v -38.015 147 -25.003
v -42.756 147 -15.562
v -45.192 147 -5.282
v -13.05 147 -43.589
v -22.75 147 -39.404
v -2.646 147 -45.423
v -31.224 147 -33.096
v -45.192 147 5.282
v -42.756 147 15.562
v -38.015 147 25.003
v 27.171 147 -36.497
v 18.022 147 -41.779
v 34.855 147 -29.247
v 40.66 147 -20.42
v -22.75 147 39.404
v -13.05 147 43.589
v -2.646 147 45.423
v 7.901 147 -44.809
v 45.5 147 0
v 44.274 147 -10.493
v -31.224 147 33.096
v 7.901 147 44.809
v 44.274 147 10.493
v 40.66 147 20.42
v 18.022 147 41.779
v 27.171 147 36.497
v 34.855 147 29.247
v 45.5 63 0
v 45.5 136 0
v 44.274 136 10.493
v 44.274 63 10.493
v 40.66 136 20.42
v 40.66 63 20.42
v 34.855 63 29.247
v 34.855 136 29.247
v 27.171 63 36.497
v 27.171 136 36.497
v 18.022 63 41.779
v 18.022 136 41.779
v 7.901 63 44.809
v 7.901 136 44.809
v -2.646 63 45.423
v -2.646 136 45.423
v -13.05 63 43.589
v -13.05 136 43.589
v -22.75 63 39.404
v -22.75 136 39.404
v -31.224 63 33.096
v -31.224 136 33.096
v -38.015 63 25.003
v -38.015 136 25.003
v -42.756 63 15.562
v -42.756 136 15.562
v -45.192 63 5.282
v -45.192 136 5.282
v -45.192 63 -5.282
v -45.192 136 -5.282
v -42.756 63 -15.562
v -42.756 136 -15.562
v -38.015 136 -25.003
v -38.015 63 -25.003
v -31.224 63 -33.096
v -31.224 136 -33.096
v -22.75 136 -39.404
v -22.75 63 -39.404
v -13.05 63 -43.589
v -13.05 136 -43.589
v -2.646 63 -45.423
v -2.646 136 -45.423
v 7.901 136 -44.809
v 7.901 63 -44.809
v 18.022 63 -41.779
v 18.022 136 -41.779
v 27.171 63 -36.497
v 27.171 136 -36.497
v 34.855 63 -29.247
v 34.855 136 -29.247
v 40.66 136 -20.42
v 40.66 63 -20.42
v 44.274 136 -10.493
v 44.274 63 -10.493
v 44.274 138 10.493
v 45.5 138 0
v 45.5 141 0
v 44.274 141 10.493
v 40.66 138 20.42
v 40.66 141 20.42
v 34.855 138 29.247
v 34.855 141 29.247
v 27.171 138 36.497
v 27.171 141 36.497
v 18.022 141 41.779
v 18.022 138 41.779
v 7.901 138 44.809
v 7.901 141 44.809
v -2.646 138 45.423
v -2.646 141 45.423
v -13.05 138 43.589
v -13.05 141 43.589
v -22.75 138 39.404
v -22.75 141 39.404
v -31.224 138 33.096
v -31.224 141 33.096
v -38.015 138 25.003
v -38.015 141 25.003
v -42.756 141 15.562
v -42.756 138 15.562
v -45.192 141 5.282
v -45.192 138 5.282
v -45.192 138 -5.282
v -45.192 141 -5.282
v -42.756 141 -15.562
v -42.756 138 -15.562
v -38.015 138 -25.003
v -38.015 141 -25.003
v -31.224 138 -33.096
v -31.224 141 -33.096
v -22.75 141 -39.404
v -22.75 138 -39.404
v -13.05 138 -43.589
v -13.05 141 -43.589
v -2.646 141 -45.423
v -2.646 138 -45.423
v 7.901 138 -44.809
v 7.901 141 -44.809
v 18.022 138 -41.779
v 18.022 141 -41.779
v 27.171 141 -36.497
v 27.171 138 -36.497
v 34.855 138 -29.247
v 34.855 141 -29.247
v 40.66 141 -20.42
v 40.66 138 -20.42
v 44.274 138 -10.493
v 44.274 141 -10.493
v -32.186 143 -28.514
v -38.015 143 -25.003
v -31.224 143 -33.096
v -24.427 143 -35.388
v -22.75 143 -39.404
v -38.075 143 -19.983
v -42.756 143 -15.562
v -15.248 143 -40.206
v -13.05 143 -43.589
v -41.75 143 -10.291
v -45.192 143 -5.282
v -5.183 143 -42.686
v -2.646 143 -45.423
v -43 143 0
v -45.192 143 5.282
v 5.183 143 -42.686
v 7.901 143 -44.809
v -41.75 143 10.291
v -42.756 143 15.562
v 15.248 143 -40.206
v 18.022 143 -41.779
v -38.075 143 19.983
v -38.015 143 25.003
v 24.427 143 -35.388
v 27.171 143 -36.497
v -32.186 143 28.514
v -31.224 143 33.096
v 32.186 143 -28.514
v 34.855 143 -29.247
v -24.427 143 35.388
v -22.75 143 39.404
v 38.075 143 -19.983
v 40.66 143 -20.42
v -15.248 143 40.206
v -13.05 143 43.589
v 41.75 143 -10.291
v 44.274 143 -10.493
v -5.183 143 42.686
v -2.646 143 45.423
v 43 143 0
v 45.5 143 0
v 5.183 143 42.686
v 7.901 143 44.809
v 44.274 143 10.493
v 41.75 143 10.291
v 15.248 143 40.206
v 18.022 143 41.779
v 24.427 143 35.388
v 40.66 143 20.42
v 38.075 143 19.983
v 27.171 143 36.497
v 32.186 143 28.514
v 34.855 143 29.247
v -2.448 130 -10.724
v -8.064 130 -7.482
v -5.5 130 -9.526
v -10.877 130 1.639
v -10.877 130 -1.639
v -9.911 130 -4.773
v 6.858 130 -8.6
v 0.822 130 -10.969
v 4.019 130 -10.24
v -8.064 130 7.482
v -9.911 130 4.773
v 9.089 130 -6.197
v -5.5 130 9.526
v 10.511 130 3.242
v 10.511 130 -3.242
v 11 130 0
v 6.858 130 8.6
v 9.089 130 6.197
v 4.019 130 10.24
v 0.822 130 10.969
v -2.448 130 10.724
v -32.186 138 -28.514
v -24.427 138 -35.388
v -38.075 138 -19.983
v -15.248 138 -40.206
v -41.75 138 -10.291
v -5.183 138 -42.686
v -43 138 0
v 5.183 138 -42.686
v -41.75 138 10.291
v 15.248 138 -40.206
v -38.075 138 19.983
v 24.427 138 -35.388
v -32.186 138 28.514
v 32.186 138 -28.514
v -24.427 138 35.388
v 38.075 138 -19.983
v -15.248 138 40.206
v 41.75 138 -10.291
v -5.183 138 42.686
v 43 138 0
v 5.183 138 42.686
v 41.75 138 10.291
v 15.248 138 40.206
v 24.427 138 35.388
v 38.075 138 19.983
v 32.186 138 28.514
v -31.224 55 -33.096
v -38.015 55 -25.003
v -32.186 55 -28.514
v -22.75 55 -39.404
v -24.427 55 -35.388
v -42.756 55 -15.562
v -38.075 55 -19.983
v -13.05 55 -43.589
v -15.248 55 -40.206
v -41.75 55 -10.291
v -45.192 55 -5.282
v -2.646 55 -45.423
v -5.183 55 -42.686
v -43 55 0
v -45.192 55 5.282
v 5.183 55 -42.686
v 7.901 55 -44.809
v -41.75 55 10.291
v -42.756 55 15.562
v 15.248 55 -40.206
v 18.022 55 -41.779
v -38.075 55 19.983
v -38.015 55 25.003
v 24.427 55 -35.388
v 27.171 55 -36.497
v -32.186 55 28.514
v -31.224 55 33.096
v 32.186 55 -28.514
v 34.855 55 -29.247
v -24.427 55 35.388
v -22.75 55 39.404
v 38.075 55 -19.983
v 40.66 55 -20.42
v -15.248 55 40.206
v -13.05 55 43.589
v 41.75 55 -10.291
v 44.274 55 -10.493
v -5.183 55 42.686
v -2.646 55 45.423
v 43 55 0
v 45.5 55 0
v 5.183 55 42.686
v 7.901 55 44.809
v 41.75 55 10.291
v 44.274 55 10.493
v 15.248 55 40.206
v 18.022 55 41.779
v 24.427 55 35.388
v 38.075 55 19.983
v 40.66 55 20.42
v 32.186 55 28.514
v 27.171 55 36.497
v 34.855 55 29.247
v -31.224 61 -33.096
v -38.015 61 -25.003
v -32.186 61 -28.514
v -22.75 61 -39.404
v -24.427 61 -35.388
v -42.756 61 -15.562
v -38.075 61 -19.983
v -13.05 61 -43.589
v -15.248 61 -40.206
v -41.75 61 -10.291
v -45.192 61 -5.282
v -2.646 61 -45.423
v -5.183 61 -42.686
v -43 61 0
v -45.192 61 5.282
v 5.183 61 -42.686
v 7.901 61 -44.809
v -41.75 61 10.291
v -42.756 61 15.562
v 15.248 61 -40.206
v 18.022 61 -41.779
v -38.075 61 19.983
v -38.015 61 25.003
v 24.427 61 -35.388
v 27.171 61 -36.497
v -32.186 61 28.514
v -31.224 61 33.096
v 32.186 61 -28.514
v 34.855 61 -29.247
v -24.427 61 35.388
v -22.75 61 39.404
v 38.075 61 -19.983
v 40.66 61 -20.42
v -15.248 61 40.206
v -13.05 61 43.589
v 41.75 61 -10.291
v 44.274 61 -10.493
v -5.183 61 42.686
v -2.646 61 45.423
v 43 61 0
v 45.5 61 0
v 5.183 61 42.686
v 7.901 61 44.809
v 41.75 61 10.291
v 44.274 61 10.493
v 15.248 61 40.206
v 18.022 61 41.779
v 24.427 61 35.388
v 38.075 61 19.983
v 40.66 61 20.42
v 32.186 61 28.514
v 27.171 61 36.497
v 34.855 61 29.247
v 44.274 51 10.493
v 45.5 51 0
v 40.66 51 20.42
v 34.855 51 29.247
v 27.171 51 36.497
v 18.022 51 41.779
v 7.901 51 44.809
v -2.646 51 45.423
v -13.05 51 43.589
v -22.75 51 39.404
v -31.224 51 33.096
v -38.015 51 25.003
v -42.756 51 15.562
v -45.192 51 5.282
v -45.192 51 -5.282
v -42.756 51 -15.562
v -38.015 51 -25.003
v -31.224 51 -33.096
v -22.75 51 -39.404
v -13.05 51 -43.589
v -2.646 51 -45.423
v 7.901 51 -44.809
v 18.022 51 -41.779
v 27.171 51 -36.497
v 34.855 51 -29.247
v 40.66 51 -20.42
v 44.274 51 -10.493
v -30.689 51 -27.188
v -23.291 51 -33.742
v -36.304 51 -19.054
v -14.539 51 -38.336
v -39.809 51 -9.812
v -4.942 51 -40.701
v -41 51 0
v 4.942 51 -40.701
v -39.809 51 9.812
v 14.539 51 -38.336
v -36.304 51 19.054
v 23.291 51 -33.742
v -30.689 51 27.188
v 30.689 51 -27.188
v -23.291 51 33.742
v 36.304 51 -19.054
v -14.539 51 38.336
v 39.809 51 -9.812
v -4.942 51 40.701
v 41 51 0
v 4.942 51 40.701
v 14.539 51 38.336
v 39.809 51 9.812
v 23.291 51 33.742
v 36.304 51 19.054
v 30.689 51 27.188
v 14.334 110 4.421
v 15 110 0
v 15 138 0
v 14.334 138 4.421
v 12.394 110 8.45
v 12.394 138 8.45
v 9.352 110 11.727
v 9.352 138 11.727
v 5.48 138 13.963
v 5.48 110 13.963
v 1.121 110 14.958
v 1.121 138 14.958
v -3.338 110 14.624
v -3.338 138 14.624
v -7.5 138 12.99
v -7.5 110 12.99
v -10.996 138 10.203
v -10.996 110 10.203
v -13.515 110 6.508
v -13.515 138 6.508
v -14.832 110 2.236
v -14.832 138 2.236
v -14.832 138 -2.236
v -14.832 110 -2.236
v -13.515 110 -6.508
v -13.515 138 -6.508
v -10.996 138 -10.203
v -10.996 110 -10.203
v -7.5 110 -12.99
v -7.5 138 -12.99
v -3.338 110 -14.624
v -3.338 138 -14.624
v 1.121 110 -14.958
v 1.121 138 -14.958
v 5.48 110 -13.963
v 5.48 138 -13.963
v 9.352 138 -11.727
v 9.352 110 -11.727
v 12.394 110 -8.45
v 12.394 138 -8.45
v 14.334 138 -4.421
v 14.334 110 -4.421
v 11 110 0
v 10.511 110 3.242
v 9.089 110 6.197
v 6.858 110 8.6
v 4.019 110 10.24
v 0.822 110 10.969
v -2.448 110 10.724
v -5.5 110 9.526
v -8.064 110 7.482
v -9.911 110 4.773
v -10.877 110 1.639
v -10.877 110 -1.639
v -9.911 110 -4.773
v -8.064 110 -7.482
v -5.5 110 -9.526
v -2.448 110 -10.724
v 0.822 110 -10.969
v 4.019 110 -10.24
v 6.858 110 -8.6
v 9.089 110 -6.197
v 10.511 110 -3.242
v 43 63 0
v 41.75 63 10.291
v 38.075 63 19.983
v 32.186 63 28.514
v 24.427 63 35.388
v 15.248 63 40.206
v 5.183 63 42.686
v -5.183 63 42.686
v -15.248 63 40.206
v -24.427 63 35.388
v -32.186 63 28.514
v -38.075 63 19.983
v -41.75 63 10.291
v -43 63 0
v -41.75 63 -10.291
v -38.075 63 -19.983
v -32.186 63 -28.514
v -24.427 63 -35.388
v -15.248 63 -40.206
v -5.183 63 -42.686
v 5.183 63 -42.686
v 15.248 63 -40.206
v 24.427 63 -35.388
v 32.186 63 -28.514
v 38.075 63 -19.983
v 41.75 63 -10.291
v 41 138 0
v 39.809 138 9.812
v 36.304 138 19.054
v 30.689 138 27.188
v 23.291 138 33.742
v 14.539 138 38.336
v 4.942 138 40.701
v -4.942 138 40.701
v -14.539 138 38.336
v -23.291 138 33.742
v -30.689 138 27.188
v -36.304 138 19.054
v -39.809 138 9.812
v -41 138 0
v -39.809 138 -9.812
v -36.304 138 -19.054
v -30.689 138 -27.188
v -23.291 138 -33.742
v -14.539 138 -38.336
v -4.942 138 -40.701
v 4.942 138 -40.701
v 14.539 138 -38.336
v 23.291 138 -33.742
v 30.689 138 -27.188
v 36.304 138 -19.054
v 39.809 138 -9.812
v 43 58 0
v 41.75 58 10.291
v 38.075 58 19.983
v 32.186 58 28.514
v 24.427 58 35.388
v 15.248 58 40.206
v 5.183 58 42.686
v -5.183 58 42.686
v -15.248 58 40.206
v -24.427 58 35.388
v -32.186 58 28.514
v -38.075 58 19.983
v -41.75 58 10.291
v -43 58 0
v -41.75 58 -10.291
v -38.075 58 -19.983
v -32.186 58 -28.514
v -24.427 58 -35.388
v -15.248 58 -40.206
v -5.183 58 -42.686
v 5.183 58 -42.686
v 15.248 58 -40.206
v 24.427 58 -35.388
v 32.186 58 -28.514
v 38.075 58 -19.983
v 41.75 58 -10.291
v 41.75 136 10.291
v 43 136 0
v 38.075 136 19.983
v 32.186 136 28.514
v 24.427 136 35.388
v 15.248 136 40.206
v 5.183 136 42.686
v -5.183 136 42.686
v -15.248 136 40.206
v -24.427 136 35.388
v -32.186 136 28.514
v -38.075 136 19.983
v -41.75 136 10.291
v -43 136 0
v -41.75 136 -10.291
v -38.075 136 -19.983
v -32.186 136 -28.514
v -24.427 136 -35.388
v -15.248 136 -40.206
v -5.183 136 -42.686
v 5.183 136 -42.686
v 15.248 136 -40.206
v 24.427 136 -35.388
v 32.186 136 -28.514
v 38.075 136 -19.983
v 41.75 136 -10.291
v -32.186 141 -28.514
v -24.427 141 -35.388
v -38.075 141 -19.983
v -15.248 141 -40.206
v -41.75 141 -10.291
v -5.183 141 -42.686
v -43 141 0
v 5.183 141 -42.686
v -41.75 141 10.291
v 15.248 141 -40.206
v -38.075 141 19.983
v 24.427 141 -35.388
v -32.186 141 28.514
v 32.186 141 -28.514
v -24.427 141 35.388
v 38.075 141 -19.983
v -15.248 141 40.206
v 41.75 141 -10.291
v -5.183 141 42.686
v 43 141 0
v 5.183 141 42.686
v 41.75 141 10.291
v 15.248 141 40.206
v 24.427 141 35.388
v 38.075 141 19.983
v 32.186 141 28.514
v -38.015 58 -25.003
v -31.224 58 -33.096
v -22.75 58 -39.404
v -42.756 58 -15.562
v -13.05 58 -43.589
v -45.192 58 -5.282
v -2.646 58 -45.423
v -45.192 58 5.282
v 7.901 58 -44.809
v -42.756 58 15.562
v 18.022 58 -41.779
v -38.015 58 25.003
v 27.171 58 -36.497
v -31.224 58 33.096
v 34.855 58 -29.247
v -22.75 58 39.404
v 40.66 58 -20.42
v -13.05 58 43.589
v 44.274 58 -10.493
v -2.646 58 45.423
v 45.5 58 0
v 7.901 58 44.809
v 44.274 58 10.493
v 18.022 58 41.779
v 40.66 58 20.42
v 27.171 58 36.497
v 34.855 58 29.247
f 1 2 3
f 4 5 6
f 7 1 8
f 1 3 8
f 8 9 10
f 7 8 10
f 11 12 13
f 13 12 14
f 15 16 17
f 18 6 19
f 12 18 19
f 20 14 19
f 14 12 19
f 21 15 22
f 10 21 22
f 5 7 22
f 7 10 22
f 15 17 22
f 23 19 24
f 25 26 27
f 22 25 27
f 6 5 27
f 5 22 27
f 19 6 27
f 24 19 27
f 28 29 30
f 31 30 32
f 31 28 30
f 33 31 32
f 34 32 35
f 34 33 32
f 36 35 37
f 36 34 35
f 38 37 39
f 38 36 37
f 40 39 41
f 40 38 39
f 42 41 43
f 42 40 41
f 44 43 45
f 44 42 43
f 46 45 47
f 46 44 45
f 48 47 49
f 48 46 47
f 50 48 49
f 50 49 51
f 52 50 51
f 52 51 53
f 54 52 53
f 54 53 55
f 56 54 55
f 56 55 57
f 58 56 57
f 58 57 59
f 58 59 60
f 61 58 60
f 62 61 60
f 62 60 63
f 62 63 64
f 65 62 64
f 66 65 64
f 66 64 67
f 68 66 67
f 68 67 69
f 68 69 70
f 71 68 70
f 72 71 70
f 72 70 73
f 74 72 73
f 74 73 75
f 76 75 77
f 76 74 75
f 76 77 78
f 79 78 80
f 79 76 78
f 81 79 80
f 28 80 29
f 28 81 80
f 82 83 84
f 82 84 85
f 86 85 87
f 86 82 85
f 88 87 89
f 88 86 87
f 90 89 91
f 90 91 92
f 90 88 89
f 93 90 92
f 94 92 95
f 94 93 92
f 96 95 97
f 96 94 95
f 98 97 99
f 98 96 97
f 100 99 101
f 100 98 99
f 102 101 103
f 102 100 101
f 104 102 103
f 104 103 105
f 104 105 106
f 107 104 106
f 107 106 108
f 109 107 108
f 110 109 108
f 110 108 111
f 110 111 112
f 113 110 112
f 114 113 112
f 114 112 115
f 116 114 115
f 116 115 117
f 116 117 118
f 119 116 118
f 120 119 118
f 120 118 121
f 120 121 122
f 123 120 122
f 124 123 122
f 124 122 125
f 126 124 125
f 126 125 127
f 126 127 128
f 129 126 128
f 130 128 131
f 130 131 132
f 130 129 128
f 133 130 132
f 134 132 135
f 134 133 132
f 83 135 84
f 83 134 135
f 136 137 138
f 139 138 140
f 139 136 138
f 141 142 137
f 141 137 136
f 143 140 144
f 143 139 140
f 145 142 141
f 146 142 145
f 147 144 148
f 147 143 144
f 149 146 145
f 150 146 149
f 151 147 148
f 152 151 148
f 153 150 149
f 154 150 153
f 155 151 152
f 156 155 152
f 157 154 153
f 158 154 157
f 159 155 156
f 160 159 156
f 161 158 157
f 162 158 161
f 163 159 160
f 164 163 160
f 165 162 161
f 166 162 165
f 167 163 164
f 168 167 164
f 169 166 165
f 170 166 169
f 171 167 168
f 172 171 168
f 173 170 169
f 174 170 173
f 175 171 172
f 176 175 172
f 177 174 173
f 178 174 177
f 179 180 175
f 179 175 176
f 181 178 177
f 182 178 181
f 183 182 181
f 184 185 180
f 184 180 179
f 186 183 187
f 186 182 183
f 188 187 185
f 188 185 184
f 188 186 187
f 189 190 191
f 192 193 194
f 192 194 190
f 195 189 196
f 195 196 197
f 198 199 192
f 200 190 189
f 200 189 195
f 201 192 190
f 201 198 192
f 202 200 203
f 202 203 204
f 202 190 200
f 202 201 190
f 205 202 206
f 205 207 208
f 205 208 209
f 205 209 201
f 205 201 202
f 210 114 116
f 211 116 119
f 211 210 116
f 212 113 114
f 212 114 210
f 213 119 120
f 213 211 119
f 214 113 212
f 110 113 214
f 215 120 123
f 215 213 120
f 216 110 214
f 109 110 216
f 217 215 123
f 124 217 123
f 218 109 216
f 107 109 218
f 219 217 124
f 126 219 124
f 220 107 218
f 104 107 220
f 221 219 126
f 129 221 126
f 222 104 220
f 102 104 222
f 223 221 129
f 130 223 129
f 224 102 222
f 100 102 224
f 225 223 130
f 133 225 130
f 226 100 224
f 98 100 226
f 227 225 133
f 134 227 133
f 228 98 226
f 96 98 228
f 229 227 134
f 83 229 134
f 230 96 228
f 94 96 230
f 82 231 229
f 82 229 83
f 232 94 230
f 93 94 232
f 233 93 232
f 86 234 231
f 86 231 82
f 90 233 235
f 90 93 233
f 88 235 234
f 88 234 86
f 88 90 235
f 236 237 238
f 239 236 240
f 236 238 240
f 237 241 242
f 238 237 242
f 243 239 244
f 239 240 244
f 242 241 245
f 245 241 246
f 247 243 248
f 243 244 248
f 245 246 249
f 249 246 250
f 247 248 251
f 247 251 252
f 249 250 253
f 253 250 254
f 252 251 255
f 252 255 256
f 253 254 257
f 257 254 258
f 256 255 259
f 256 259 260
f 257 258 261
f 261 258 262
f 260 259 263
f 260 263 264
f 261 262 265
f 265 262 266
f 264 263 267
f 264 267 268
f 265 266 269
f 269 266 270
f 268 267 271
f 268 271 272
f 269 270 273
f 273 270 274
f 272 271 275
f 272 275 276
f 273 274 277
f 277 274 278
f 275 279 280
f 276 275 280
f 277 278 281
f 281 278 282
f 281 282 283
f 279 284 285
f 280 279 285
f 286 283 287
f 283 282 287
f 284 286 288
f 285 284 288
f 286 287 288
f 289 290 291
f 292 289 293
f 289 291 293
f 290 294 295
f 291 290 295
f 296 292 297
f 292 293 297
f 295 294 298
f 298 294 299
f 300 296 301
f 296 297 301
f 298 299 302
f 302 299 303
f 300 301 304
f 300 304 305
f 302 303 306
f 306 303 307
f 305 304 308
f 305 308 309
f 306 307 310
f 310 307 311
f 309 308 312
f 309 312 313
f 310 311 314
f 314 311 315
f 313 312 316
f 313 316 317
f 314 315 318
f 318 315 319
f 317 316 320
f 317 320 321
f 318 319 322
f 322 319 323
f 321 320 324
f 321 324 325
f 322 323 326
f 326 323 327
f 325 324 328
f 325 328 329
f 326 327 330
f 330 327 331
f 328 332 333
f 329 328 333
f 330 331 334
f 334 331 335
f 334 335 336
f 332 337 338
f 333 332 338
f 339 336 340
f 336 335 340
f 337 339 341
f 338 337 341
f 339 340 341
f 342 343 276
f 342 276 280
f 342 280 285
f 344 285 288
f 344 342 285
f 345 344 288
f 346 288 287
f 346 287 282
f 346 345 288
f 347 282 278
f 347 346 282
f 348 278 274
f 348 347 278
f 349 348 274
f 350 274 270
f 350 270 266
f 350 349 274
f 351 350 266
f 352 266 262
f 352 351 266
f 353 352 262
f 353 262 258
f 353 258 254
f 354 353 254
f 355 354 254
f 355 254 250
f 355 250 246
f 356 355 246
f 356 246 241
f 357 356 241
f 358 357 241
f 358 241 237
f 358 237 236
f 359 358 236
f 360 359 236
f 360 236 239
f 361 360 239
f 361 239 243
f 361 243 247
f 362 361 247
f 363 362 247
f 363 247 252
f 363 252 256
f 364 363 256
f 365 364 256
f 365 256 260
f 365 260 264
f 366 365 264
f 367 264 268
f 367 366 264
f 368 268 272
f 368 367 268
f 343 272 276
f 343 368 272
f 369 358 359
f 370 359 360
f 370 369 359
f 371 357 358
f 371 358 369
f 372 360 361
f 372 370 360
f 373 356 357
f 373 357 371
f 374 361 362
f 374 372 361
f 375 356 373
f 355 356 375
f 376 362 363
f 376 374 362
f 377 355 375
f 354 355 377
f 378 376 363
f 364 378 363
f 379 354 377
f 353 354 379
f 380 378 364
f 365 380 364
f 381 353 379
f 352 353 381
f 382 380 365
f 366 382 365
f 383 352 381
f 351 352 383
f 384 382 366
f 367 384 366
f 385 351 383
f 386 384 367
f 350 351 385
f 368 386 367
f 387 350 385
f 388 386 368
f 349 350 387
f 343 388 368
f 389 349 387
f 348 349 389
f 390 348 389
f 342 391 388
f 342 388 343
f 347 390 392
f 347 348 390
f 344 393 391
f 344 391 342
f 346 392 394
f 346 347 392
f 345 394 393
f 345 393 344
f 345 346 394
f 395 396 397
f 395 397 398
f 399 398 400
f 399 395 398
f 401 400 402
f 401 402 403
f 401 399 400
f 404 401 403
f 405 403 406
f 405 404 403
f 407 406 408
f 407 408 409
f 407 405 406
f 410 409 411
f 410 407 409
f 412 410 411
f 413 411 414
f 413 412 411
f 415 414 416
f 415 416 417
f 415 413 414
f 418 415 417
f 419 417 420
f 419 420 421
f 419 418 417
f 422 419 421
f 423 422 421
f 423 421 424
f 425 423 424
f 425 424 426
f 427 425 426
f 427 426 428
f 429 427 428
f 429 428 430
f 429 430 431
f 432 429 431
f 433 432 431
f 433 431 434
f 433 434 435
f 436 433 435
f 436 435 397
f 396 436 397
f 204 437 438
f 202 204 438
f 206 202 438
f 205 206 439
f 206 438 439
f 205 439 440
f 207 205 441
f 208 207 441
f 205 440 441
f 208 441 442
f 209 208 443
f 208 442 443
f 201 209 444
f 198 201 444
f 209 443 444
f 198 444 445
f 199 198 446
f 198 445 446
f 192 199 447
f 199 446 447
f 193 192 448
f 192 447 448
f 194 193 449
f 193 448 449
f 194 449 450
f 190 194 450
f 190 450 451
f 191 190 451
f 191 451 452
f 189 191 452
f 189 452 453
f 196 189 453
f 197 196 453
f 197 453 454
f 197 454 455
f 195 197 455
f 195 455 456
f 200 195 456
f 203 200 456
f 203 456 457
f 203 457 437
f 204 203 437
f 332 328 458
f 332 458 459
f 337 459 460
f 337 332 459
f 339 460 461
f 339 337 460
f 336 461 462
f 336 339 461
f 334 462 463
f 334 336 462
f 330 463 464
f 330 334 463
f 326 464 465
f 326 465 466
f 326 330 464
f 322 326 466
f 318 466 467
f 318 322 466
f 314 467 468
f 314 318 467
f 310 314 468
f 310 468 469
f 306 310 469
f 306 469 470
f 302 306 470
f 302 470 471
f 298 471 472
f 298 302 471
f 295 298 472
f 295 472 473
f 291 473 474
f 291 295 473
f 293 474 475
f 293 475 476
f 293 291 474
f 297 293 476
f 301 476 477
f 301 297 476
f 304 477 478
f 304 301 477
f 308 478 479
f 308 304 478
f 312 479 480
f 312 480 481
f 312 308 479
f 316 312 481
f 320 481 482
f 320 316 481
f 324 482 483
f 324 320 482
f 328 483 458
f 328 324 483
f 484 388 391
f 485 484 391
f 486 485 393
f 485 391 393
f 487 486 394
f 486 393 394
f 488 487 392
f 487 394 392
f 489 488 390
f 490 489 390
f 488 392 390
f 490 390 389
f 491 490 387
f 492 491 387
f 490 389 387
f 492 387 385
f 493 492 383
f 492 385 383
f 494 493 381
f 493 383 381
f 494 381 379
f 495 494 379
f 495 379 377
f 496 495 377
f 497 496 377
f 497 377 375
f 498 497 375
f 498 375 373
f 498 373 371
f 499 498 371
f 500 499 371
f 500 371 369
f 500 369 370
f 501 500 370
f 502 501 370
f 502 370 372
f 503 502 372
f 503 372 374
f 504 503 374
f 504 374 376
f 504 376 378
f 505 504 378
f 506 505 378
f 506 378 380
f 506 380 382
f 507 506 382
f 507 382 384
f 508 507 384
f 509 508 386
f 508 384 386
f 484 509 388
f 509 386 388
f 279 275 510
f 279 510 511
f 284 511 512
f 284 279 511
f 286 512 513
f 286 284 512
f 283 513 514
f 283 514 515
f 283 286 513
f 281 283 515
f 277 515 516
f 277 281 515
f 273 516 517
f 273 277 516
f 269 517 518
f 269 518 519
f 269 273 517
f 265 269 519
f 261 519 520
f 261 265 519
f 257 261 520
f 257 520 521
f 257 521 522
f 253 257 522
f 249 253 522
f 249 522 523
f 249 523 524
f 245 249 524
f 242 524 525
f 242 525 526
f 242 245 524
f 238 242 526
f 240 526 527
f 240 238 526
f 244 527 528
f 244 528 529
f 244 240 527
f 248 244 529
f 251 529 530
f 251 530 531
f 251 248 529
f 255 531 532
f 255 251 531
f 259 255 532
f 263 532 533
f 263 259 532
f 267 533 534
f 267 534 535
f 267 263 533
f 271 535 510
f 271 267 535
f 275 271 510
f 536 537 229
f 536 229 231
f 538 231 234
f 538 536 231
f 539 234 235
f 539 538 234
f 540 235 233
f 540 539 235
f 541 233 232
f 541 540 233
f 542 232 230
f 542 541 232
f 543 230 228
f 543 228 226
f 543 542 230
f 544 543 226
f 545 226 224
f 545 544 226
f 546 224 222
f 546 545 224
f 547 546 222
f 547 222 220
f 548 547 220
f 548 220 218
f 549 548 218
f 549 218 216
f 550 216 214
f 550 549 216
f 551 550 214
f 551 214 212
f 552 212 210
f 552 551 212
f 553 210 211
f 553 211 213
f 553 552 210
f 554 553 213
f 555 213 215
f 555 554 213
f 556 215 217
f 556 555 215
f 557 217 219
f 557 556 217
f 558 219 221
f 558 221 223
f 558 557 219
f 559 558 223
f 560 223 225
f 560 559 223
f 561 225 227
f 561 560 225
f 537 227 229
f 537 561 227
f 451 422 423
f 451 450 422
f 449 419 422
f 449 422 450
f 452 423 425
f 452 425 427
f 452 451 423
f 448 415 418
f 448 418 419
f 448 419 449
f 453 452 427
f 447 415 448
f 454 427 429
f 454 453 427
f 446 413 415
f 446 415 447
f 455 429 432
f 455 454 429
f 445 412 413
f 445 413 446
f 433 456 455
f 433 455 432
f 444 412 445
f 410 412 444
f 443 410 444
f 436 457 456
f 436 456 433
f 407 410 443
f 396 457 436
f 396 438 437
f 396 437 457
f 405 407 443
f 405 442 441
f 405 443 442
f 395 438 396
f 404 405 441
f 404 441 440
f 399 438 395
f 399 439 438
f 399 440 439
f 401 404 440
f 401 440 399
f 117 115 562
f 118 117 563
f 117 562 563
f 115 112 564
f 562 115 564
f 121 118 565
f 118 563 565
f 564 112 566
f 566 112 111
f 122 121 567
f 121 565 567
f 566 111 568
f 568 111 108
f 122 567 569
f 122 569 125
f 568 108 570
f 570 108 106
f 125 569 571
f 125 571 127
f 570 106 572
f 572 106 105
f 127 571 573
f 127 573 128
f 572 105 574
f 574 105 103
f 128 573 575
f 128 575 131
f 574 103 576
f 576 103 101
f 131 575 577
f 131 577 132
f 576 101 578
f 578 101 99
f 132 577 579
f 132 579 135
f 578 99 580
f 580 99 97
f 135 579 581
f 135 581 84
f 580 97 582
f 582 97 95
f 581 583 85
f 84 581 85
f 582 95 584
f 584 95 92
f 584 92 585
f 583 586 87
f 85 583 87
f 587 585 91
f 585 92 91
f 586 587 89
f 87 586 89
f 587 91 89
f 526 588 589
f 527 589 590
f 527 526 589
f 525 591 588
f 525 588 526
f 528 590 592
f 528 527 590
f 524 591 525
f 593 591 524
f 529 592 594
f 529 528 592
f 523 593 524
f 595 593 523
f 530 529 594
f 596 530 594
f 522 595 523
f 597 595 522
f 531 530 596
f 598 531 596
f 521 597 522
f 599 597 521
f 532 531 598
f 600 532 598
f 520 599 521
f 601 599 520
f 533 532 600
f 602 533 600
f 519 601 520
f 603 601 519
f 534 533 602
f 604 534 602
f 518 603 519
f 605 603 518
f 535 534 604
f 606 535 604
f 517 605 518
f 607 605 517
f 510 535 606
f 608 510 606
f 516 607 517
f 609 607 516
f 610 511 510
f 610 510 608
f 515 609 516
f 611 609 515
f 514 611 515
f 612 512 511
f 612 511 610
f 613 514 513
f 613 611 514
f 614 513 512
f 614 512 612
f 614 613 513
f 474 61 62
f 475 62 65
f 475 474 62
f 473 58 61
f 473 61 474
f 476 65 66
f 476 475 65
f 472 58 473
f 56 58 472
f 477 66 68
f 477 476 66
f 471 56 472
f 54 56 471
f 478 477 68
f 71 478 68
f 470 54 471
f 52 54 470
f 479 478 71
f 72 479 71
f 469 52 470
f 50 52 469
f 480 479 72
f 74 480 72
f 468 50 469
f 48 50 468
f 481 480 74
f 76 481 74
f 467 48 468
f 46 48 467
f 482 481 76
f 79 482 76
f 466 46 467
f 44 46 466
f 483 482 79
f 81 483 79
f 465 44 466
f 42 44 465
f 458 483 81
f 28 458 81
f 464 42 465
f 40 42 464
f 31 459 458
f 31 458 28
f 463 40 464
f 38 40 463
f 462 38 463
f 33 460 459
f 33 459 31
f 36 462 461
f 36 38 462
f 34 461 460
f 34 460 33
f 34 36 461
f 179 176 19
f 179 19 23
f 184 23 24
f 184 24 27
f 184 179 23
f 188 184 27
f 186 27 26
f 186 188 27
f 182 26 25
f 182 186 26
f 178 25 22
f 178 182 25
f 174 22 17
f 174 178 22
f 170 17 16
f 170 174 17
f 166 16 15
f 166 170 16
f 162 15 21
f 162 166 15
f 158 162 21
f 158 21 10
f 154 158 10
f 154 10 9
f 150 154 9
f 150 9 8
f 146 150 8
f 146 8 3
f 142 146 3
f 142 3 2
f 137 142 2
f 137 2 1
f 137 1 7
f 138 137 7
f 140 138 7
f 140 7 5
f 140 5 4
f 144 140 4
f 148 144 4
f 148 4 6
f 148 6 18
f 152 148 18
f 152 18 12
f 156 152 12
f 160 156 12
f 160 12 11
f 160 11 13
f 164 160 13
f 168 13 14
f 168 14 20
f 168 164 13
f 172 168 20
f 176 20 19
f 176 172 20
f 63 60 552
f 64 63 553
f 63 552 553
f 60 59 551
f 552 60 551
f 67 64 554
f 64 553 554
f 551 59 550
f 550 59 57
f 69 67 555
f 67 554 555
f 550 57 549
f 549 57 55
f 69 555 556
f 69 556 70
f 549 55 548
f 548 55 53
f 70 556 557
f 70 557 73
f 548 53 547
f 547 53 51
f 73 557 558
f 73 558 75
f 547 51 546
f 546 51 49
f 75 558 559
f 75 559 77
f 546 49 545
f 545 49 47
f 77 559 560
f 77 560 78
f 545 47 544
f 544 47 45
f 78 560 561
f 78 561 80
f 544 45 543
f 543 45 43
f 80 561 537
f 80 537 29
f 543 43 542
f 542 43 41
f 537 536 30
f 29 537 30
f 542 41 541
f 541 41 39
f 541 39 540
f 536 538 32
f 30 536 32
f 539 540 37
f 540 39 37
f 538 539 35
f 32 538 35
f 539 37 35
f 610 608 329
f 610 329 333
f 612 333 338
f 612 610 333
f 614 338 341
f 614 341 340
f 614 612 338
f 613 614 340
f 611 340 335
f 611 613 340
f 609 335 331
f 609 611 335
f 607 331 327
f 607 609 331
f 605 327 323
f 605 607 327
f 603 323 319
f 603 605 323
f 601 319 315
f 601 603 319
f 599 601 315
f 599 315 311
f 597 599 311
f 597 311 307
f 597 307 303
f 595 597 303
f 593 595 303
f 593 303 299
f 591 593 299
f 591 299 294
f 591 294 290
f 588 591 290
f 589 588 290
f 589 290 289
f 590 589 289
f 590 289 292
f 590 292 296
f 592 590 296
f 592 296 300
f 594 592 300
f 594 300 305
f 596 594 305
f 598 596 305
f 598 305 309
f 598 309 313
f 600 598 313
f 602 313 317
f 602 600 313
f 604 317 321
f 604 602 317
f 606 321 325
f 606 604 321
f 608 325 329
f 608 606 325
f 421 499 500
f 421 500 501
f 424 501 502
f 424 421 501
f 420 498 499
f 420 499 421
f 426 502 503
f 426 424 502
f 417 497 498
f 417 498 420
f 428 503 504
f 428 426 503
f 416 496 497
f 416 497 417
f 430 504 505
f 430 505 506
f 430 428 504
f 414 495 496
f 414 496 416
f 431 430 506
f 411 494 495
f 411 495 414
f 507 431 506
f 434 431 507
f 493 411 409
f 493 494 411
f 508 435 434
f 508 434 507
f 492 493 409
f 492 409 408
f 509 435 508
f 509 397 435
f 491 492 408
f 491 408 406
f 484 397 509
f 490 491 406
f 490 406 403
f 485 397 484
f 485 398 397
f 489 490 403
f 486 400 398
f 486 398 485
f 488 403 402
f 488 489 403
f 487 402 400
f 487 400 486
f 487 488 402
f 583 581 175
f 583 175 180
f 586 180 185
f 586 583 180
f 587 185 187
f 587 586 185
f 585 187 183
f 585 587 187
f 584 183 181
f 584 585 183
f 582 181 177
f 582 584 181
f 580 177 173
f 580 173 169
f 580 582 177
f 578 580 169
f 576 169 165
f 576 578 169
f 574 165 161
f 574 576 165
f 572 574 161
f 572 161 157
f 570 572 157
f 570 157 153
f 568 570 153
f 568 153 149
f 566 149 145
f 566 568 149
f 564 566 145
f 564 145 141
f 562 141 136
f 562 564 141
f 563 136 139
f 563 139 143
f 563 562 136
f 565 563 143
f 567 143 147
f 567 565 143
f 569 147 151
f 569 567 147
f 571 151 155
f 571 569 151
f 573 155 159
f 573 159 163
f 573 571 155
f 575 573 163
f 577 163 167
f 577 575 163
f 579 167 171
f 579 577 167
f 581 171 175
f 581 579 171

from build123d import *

# Parameters (mm, degrees)
PAD021_DEPTH         = 50
SKETCH042_R          = 45.5
PAD022_DEPTH         = 200
SKETCH043_R          = 41
SKETCH043_R_2        = 15
POCKET025_DEPTH      = 138
POCKET026_START      = -141
SKETCH044_R          = 47.5
SKETCH044_R_2        = 43
POCKET026_DEPTH      = 2
POCKET027_START      = -136
POCKET027_DEPTH      = 2
POCKET028_START      = -55
POCKET028_DEPTH      = 3
SKETCH049_R          = 30
POCKET030_DEPTH      = 110
POCKET031_START      = -61
POCKET031_DEPTH      = 2
SKETCH052_R          = 11
POCKET032_DEPTH      = 130
POCKET032_DEPTH_BACK = 5


with BuildPart() as body070:
    # Sketch041 → Pad021 (new body, symmetric)
    with BuildSketch(Plane.XY):
        Polygon((-45.5, 147), (45.5, 147), (45.5, 51), (0, 51), (-45.5, 51), align=None)
    extrude(amount=PAD021_DEPTH, both=True)


with BuildPart() as body071:
    # Sketch042 → Pad022 (new body)
    with BuildSketch(Plane.XZ):
        Circle(SKETCH042_R)
    extrude(amount=-PAD022_DEPTH)

    # Boolean004: intersect Body070
    add(body070.part, mode=Mode.INTERSECT)

    # Sketch043 → Pocket025 (cut)
    with BuildSketch(Plane.XZ):
        Circle(SKETCH043_R)
        Circle(SKETCH043_R_2, mode=Mode.SUBTRACT)
    extrude(amount=-POCKET025_DEPTH, mode=Mode.SUBTRACT)

    # Sketch044 → Pocket026 (cut)
    with BuildSketch(Plane.XZ.offset(POCKET026_START)):
        Circle(SKETCH044_R)
        Circle(SKETCH044_R_2, mode=Mode.SUBTRACT)
    extrude(amount=-POCKET026_DEPTH, mode=Mode.SUBTRACT)

    # Sketch044 → Pocket027 (cut)
    with BuildSketch(Plane.XZ.offset(POCKET027_START)):
        Circle(SKETCH044_R)
        Circle(SKETCH044_R_2, mode=Mode.SUBTRACT)
    extrude(amount=-POCKET027_DEPTH, mode=Mode.SUBTRACT)

    # Sketch044 → Pocket028 (cut)
    with BuildSketch(Plane.XZ.offset(POCKET028_START)):
        Circle(SKETCH044_R)
        Circle(SKETCH044_R_2, mode=Mode.SUBTRACT)
    extrude(amount=-POCKET028_DEPTH, mode=Mode.SUBTRACT)

    # Sketch049 → Pocket030 (cut)
    with BuildSketch(Plane.XZ):
        Circle(SKETCH049_R)
    extrude(amount=-POCKET030_DEPTH, mode=Mode.SUBTRACT)

    # Sketch044 → Pocket031 (cut)
    with BuildSketch(Plane.XZ.offset(POCKET031_START)):
        Circle(SKETCH044_R)
        Circle(SKETCH044_R_2, mode=Mode.SUBTRACT)
    extrude(amount=-POCKET031_DEPTH, mode=Mode.SUBTRACT)

    # Sketch052 → Pocket032 (cut, two sides)
    with BuildSketch(Plane.XZ) as pocket032_sk:
        Circle(SKETCH052_R)
    extrude(amount=-POCKET032_DEPTH, mode=Mode.SUBTRACT)
    extrude(pocket032_sk.sketch, amount=POCKET032_DEPTH_BACK, mode=Mode.SUBTRACT)


solid = body071.part
